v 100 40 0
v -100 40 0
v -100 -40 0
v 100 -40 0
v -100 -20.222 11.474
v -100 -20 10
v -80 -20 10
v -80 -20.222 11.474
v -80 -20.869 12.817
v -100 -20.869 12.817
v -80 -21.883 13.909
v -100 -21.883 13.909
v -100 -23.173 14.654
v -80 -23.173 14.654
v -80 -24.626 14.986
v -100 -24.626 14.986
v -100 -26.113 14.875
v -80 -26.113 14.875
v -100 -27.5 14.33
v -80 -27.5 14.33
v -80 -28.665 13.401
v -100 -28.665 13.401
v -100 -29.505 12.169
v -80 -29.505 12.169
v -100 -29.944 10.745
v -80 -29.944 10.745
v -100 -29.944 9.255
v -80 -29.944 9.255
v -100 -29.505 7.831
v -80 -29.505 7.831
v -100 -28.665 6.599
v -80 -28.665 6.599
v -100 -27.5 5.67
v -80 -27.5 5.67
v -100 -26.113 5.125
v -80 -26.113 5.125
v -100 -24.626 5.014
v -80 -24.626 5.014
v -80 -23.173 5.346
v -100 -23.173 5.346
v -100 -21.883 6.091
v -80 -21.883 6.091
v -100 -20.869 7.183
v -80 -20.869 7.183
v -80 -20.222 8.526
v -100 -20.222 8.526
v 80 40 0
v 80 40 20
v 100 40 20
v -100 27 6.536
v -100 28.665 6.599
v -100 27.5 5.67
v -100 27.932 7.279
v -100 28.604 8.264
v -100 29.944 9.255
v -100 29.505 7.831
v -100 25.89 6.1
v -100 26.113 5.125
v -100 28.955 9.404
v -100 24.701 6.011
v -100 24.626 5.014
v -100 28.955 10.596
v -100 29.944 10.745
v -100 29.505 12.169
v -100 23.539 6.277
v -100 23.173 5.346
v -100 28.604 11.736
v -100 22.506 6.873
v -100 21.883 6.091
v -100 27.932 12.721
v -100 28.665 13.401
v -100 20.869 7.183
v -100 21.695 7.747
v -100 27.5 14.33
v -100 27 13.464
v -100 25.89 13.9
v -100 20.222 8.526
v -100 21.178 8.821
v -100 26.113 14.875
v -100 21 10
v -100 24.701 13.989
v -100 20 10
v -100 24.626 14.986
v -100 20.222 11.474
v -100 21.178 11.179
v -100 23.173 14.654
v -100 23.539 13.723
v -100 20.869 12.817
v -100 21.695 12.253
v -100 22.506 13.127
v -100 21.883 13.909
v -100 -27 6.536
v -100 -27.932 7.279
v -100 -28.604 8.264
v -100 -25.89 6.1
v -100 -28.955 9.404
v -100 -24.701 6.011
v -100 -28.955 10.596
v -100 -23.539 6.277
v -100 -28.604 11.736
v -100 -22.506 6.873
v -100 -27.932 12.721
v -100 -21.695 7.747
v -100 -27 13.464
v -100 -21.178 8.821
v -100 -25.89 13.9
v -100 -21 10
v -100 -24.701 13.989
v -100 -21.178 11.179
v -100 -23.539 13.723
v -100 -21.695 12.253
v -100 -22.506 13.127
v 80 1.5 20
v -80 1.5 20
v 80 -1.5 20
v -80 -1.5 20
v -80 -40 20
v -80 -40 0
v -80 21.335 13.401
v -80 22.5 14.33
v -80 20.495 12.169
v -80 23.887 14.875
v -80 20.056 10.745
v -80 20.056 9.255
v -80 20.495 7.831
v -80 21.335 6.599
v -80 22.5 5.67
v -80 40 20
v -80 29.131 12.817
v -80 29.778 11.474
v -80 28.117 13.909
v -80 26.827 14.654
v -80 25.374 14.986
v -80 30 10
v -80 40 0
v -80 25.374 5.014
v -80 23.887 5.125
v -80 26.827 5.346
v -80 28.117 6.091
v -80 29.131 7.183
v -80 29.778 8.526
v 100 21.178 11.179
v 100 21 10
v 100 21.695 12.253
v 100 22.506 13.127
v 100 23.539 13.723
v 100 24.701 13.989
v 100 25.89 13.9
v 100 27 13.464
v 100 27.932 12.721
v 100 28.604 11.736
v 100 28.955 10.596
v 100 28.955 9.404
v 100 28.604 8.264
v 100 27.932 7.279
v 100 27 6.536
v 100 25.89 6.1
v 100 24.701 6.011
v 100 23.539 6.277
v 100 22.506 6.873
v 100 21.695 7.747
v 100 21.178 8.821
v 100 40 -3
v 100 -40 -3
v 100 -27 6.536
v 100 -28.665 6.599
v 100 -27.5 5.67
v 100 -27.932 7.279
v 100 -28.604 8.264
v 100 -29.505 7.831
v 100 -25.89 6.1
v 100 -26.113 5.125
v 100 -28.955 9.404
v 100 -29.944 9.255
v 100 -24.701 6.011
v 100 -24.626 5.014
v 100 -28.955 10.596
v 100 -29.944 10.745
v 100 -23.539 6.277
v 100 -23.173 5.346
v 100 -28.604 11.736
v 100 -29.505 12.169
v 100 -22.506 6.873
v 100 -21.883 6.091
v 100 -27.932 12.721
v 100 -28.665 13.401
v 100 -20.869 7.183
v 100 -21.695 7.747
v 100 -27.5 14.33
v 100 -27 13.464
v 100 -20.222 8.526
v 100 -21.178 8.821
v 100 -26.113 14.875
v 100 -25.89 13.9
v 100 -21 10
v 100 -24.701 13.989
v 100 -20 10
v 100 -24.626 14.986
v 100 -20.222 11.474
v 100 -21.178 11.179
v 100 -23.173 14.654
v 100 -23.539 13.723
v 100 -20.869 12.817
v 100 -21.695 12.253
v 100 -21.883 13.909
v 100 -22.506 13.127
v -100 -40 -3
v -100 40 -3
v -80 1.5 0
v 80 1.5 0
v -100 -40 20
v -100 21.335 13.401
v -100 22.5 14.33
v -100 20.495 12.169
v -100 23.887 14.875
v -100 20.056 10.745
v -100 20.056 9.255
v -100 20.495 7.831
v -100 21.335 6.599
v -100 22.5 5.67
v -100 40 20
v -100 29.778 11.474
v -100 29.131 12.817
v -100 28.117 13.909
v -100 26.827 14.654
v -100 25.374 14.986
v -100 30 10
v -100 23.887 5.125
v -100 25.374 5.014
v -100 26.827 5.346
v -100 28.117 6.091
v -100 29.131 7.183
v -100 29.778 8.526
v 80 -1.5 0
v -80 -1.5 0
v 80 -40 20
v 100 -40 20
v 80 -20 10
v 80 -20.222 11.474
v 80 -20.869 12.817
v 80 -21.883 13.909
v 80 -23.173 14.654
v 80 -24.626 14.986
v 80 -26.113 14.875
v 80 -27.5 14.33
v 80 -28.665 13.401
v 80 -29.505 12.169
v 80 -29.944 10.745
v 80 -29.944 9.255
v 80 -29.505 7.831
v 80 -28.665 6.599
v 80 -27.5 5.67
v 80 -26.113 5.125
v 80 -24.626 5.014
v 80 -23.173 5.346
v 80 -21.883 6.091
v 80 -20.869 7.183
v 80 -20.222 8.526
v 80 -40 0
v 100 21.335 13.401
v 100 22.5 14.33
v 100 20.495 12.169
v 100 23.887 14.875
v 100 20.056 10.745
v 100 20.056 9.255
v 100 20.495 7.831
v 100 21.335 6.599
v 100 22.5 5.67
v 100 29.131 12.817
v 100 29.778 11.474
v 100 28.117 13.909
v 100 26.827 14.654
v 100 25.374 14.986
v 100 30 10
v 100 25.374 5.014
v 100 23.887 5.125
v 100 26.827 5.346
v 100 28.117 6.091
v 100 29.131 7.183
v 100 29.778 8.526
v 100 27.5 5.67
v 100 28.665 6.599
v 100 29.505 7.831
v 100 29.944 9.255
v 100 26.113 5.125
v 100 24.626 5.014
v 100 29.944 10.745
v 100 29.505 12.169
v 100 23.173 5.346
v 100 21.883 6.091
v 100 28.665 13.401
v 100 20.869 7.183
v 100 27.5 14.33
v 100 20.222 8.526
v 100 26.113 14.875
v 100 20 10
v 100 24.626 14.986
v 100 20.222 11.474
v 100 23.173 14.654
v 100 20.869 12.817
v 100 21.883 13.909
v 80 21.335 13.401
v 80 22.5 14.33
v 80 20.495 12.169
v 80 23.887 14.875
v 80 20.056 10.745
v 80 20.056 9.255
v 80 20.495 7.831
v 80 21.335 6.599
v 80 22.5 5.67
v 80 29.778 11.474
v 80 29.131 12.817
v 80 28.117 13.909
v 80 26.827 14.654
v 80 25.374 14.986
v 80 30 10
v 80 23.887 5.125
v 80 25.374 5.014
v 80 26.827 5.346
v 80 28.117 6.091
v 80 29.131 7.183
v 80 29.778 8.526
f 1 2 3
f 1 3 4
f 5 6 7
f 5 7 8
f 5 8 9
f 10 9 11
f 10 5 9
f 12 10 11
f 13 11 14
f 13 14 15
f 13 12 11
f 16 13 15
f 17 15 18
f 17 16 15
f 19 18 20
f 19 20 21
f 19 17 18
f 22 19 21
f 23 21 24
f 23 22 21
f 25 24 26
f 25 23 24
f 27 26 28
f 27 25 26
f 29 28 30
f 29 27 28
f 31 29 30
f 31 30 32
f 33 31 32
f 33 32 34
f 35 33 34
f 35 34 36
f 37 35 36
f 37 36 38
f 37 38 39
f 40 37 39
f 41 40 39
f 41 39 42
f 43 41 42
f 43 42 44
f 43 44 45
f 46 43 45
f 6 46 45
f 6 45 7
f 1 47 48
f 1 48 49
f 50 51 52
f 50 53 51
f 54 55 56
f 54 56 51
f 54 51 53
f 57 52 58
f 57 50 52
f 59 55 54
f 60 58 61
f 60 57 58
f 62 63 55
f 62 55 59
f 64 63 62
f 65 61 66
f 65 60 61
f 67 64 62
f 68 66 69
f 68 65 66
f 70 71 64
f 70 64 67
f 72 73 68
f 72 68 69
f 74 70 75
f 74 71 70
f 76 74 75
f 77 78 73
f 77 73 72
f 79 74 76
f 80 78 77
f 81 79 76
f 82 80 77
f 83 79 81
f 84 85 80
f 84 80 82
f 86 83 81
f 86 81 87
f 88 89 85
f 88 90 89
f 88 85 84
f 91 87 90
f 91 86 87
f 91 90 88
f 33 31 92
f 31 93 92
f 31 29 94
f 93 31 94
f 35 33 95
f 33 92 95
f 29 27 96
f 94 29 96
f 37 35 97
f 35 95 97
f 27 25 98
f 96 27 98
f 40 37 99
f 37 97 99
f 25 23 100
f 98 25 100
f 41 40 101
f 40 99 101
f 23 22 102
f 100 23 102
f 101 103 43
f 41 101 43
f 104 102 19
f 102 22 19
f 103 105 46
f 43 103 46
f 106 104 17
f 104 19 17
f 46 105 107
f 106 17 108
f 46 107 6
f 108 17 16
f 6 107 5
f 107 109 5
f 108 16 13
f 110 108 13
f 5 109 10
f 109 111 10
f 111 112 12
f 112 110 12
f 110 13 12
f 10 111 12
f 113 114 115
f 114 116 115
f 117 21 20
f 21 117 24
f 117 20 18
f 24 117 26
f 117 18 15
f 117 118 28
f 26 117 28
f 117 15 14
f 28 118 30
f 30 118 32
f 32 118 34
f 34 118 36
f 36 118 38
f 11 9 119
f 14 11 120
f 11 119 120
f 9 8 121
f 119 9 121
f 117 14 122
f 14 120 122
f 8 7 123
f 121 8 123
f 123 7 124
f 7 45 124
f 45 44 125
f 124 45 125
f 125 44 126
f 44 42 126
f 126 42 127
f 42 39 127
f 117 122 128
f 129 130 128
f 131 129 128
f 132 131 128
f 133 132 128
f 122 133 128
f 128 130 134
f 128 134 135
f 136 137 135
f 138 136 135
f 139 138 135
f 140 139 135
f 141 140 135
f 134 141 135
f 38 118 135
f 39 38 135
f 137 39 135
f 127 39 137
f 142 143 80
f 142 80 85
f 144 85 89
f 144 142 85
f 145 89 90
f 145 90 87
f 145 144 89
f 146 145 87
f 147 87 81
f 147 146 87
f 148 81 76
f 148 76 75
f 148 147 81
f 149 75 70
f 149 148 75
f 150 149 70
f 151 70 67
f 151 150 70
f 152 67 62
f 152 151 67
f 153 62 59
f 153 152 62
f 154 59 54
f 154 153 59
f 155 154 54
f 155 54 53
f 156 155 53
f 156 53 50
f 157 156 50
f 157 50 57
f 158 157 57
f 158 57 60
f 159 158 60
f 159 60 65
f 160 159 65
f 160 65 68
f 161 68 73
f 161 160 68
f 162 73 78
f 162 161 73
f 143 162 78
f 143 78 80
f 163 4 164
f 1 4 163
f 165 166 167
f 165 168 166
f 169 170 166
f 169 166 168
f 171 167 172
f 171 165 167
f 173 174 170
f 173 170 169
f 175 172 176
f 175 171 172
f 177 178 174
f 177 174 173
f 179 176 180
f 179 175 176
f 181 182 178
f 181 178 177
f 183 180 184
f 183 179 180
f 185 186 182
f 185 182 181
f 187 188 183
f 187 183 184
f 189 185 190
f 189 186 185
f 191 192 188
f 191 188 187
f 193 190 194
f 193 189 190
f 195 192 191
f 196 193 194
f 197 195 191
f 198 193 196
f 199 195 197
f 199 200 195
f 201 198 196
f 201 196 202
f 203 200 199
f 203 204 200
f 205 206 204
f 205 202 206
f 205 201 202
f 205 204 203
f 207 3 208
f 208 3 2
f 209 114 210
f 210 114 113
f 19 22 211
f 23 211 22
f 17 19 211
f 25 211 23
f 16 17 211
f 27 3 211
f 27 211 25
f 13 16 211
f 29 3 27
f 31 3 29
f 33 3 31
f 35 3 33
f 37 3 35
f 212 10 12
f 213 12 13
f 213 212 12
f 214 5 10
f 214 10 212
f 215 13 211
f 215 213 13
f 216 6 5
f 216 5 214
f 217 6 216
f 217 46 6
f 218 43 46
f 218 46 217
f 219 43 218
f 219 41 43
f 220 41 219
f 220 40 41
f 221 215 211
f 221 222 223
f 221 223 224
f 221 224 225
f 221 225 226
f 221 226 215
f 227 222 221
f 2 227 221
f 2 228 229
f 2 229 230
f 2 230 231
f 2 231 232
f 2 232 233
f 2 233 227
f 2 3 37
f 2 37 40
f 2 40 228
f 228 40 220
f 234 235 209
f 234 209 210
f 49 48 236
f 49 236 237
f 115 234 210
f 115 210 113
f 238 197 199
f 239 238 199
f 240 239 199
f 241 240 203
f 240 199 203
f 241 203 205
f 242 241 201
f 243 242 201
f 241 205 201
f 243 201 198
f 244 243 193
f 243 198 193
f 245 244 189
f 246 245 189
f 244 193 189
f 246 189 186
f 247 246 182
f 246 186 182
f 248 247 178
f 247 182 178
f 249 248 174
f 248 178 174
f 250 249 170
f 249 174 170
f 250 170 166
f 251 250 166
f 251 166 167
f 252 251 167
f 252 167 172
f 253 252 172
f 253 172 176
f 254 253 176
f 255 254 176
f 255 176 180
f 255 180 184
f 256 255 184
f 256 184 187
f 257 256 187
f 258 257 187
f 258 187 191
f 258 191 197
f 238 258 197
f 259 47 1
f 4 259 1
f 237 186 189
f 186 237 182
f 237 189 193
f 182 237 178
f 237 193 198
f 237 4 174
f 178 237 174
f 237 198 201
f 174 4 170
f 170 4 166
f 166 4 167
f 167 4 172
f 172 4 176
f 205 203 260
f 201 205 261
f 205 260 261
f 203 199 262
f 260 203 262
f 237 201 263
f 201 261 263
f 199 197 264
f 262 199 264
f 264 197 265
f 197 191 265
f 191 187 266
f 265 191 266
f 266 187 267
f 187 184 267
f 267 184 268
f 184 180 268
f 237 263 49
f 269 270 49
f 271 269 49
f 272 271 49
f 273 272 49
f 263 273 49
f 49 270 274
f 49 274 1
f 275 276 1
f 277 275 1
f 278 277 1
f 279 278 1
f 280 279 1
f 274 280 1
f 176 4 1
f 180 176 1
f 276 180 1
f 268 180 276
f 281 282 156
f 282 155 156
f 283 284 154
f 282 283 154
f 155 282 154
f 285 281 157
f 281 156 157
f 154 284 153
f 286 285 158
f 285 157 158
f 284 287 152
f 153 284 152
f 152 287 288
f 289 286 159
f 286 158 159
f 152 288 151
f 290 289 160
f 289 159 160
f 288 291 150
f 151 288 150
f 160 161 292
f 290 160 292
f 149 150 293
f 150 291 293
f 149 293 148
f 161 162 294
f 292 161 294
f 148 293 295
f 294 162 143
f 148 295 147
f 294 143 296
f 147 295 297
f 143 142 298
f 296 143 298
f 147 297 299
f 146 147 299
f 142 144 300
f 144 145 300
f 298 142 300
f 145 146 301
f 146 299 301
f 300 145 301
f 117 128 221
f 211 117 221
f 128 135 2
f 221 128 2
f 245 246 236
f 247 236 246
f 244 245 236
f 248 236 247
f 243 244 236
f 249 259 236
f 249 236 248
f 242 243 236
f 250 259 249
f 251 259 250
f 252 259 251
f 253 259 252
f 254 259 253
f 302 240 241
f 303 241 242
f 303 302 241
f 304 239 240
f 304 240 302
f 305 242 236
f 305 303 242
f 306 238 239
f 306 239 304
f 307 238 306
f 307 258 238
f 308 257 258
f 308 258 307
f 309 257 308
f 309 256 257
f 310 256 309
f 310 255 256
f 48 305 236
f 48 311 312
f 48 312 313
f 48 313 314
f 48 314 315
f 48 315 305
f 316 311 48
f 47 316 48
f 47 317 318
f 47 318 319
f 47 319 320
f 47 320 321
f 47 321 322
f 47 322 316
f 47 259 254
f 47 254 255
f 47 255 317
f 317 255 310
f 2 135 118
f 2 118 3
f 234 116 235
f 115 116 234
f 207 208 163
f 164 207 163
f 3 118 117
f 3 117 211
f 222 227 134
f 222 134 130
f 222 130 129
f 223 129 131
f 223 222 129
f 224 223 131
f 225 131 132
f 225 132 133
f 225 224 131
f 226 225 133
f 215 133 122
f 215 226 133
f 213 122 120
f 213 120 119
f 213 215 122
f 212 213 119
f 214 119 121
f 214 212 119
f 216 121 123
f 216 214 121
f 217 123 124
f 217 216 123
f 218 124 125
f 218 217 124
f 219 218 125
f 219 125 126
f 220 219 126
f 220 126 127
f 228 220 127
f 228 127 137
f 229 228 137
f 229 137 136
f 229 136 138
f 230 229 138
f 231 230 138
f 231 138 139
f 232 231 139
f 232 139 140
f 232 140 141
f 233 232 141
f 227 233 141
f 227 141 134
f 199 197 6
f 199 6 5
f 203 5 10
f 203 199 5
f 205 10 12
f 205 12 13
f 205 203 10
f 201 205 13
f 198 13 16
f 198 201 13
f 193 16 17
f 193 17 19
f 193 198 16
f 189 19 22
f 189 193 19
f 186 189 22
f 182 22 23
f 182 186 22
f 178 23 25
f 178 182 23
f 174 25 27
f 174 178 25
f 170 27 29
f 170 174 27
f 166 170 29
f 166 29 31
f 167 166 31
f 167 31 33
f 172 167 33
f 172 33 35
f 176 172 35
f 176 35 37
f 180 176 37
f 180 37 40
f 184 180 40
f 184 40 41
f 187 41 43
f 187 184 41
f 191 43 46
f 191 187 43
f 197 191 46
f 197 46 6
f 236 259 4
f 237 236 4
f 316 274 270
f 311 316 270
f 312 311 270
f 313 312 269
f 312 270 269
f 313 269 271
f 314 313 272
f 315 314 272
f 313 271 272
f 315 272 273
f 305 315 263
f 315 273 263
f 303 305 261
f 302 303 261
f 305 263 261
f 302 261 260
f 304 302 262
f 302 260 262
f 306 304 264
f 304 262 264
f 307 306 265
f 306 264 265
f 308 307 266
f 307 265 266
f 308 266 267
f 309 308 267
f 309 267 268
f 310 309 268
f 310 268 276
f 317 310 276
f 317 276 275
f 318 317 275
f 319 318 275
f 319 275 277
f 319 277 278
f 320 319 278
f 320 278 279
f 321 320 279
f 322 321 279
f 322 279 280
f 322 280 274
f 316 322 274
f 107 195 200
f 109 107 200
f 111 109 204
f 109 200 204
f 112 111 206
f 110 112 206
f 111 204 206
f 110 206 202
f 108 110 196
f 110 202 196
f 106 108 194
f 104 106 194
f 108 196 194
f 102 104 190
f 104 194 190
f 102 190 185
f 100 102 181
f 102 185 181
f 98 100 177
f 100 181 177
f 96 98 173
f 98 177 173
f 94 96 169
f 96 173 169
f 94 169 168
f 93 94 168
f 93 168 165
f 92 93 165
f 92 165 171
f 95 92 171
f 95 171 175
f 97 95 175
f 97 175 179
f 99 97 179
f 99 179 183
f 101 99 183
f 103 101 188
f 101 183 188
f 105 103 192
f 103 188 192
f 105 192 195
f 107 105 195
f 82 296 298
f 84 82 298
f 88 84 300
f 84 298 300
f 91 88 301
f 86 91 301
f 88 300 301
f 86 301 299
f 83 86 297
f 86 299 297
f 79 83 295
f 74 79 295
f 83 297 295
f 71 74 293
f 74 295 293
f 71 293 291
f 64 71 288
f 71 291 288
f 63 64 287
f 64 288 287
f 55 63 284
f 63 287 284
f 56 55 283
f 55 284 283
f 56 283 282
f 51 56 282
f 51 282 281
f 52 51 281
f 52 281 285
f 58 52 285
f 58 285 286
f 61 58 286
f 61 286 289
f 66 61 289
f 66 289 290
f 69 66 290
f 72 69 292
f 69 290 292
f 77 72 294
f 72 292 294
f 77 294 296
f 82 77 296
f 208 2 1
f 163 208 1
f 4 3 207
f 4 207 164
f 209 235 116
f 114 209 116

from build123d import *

# Parameters (mm, degrees)
F0_W      = 200
F0_H      = 80
F1_DEPTH  = 3.0000000261
F2_W      = 20
F2_H      = 80
F3_DEPTH  = 20
F4_R      = 5
F5_DEPTH  = 25
F7_W      = 160
F7_H      = 20
F8_DEPTH  = 1.5
F9_R      = 5
F9_R_2    = 4
F10_DEPTH = 200


with BuildPart() as f1:
    # F0 (on Top) → F1 (new body)
    with BuildSketch(Plane.XY):
        Rectangle(F0_W, F0_H)
    extrude(amount=-F1_DEPTH)


with BuildPart() as f3:
    # F2 (on face) → F3 (new body)
    with BuildSketch(Plane.XY):
        with Locations((90, 0)):
            Rectangle(F2_W, F2_H)
    extrude(amount=F3_DEPTH)

    # F4 (on face) → F5 (cut)
    with BuildSketch(Plane.YZ.offset(100)):
        with Locations((-25, 10)):
            Circle(F4_R)
        with Locations((25, 10)):
            Circle(F4_R)
    extrude(amount=-F5_DEPTH, mode=Mode.SUBTRACT)


with BuildPart() as f6_1:
    # F6: instance of F3
    add(f3.part.mirror(Plane.YZ))


with BuildPart() as f8:
    # F7 (on Front) → F8 (new body, symmetric)
    with BuildSketch(Plane.XZ):
        with Locations((0, 10)):
            Rectangle(F7_W, F7_H)
    extrude(amount=F8_DEPTH, both=True)


with BuildPart() as f10:
    # F9 (on face) → F10 (new body, through all)
    with BuildSketch(Plane.YZ.offset(100)):
        with Locations((-25, 10)):
            Circle(F9_R)
        with Locations((-25, 10)):
            Circle(F9_R_2, mode=Mode.SUBTRACT)
    extrude(amount=-F10_DEPTH)


with BuildPart() as f11_1:
    # F11: instance of F10
    add(f10.part.mirror(Plane.XZ))


solid = Compound([f1.part, f3.part, f6_1.part, f8.part, f10.part, f11_1.part])
